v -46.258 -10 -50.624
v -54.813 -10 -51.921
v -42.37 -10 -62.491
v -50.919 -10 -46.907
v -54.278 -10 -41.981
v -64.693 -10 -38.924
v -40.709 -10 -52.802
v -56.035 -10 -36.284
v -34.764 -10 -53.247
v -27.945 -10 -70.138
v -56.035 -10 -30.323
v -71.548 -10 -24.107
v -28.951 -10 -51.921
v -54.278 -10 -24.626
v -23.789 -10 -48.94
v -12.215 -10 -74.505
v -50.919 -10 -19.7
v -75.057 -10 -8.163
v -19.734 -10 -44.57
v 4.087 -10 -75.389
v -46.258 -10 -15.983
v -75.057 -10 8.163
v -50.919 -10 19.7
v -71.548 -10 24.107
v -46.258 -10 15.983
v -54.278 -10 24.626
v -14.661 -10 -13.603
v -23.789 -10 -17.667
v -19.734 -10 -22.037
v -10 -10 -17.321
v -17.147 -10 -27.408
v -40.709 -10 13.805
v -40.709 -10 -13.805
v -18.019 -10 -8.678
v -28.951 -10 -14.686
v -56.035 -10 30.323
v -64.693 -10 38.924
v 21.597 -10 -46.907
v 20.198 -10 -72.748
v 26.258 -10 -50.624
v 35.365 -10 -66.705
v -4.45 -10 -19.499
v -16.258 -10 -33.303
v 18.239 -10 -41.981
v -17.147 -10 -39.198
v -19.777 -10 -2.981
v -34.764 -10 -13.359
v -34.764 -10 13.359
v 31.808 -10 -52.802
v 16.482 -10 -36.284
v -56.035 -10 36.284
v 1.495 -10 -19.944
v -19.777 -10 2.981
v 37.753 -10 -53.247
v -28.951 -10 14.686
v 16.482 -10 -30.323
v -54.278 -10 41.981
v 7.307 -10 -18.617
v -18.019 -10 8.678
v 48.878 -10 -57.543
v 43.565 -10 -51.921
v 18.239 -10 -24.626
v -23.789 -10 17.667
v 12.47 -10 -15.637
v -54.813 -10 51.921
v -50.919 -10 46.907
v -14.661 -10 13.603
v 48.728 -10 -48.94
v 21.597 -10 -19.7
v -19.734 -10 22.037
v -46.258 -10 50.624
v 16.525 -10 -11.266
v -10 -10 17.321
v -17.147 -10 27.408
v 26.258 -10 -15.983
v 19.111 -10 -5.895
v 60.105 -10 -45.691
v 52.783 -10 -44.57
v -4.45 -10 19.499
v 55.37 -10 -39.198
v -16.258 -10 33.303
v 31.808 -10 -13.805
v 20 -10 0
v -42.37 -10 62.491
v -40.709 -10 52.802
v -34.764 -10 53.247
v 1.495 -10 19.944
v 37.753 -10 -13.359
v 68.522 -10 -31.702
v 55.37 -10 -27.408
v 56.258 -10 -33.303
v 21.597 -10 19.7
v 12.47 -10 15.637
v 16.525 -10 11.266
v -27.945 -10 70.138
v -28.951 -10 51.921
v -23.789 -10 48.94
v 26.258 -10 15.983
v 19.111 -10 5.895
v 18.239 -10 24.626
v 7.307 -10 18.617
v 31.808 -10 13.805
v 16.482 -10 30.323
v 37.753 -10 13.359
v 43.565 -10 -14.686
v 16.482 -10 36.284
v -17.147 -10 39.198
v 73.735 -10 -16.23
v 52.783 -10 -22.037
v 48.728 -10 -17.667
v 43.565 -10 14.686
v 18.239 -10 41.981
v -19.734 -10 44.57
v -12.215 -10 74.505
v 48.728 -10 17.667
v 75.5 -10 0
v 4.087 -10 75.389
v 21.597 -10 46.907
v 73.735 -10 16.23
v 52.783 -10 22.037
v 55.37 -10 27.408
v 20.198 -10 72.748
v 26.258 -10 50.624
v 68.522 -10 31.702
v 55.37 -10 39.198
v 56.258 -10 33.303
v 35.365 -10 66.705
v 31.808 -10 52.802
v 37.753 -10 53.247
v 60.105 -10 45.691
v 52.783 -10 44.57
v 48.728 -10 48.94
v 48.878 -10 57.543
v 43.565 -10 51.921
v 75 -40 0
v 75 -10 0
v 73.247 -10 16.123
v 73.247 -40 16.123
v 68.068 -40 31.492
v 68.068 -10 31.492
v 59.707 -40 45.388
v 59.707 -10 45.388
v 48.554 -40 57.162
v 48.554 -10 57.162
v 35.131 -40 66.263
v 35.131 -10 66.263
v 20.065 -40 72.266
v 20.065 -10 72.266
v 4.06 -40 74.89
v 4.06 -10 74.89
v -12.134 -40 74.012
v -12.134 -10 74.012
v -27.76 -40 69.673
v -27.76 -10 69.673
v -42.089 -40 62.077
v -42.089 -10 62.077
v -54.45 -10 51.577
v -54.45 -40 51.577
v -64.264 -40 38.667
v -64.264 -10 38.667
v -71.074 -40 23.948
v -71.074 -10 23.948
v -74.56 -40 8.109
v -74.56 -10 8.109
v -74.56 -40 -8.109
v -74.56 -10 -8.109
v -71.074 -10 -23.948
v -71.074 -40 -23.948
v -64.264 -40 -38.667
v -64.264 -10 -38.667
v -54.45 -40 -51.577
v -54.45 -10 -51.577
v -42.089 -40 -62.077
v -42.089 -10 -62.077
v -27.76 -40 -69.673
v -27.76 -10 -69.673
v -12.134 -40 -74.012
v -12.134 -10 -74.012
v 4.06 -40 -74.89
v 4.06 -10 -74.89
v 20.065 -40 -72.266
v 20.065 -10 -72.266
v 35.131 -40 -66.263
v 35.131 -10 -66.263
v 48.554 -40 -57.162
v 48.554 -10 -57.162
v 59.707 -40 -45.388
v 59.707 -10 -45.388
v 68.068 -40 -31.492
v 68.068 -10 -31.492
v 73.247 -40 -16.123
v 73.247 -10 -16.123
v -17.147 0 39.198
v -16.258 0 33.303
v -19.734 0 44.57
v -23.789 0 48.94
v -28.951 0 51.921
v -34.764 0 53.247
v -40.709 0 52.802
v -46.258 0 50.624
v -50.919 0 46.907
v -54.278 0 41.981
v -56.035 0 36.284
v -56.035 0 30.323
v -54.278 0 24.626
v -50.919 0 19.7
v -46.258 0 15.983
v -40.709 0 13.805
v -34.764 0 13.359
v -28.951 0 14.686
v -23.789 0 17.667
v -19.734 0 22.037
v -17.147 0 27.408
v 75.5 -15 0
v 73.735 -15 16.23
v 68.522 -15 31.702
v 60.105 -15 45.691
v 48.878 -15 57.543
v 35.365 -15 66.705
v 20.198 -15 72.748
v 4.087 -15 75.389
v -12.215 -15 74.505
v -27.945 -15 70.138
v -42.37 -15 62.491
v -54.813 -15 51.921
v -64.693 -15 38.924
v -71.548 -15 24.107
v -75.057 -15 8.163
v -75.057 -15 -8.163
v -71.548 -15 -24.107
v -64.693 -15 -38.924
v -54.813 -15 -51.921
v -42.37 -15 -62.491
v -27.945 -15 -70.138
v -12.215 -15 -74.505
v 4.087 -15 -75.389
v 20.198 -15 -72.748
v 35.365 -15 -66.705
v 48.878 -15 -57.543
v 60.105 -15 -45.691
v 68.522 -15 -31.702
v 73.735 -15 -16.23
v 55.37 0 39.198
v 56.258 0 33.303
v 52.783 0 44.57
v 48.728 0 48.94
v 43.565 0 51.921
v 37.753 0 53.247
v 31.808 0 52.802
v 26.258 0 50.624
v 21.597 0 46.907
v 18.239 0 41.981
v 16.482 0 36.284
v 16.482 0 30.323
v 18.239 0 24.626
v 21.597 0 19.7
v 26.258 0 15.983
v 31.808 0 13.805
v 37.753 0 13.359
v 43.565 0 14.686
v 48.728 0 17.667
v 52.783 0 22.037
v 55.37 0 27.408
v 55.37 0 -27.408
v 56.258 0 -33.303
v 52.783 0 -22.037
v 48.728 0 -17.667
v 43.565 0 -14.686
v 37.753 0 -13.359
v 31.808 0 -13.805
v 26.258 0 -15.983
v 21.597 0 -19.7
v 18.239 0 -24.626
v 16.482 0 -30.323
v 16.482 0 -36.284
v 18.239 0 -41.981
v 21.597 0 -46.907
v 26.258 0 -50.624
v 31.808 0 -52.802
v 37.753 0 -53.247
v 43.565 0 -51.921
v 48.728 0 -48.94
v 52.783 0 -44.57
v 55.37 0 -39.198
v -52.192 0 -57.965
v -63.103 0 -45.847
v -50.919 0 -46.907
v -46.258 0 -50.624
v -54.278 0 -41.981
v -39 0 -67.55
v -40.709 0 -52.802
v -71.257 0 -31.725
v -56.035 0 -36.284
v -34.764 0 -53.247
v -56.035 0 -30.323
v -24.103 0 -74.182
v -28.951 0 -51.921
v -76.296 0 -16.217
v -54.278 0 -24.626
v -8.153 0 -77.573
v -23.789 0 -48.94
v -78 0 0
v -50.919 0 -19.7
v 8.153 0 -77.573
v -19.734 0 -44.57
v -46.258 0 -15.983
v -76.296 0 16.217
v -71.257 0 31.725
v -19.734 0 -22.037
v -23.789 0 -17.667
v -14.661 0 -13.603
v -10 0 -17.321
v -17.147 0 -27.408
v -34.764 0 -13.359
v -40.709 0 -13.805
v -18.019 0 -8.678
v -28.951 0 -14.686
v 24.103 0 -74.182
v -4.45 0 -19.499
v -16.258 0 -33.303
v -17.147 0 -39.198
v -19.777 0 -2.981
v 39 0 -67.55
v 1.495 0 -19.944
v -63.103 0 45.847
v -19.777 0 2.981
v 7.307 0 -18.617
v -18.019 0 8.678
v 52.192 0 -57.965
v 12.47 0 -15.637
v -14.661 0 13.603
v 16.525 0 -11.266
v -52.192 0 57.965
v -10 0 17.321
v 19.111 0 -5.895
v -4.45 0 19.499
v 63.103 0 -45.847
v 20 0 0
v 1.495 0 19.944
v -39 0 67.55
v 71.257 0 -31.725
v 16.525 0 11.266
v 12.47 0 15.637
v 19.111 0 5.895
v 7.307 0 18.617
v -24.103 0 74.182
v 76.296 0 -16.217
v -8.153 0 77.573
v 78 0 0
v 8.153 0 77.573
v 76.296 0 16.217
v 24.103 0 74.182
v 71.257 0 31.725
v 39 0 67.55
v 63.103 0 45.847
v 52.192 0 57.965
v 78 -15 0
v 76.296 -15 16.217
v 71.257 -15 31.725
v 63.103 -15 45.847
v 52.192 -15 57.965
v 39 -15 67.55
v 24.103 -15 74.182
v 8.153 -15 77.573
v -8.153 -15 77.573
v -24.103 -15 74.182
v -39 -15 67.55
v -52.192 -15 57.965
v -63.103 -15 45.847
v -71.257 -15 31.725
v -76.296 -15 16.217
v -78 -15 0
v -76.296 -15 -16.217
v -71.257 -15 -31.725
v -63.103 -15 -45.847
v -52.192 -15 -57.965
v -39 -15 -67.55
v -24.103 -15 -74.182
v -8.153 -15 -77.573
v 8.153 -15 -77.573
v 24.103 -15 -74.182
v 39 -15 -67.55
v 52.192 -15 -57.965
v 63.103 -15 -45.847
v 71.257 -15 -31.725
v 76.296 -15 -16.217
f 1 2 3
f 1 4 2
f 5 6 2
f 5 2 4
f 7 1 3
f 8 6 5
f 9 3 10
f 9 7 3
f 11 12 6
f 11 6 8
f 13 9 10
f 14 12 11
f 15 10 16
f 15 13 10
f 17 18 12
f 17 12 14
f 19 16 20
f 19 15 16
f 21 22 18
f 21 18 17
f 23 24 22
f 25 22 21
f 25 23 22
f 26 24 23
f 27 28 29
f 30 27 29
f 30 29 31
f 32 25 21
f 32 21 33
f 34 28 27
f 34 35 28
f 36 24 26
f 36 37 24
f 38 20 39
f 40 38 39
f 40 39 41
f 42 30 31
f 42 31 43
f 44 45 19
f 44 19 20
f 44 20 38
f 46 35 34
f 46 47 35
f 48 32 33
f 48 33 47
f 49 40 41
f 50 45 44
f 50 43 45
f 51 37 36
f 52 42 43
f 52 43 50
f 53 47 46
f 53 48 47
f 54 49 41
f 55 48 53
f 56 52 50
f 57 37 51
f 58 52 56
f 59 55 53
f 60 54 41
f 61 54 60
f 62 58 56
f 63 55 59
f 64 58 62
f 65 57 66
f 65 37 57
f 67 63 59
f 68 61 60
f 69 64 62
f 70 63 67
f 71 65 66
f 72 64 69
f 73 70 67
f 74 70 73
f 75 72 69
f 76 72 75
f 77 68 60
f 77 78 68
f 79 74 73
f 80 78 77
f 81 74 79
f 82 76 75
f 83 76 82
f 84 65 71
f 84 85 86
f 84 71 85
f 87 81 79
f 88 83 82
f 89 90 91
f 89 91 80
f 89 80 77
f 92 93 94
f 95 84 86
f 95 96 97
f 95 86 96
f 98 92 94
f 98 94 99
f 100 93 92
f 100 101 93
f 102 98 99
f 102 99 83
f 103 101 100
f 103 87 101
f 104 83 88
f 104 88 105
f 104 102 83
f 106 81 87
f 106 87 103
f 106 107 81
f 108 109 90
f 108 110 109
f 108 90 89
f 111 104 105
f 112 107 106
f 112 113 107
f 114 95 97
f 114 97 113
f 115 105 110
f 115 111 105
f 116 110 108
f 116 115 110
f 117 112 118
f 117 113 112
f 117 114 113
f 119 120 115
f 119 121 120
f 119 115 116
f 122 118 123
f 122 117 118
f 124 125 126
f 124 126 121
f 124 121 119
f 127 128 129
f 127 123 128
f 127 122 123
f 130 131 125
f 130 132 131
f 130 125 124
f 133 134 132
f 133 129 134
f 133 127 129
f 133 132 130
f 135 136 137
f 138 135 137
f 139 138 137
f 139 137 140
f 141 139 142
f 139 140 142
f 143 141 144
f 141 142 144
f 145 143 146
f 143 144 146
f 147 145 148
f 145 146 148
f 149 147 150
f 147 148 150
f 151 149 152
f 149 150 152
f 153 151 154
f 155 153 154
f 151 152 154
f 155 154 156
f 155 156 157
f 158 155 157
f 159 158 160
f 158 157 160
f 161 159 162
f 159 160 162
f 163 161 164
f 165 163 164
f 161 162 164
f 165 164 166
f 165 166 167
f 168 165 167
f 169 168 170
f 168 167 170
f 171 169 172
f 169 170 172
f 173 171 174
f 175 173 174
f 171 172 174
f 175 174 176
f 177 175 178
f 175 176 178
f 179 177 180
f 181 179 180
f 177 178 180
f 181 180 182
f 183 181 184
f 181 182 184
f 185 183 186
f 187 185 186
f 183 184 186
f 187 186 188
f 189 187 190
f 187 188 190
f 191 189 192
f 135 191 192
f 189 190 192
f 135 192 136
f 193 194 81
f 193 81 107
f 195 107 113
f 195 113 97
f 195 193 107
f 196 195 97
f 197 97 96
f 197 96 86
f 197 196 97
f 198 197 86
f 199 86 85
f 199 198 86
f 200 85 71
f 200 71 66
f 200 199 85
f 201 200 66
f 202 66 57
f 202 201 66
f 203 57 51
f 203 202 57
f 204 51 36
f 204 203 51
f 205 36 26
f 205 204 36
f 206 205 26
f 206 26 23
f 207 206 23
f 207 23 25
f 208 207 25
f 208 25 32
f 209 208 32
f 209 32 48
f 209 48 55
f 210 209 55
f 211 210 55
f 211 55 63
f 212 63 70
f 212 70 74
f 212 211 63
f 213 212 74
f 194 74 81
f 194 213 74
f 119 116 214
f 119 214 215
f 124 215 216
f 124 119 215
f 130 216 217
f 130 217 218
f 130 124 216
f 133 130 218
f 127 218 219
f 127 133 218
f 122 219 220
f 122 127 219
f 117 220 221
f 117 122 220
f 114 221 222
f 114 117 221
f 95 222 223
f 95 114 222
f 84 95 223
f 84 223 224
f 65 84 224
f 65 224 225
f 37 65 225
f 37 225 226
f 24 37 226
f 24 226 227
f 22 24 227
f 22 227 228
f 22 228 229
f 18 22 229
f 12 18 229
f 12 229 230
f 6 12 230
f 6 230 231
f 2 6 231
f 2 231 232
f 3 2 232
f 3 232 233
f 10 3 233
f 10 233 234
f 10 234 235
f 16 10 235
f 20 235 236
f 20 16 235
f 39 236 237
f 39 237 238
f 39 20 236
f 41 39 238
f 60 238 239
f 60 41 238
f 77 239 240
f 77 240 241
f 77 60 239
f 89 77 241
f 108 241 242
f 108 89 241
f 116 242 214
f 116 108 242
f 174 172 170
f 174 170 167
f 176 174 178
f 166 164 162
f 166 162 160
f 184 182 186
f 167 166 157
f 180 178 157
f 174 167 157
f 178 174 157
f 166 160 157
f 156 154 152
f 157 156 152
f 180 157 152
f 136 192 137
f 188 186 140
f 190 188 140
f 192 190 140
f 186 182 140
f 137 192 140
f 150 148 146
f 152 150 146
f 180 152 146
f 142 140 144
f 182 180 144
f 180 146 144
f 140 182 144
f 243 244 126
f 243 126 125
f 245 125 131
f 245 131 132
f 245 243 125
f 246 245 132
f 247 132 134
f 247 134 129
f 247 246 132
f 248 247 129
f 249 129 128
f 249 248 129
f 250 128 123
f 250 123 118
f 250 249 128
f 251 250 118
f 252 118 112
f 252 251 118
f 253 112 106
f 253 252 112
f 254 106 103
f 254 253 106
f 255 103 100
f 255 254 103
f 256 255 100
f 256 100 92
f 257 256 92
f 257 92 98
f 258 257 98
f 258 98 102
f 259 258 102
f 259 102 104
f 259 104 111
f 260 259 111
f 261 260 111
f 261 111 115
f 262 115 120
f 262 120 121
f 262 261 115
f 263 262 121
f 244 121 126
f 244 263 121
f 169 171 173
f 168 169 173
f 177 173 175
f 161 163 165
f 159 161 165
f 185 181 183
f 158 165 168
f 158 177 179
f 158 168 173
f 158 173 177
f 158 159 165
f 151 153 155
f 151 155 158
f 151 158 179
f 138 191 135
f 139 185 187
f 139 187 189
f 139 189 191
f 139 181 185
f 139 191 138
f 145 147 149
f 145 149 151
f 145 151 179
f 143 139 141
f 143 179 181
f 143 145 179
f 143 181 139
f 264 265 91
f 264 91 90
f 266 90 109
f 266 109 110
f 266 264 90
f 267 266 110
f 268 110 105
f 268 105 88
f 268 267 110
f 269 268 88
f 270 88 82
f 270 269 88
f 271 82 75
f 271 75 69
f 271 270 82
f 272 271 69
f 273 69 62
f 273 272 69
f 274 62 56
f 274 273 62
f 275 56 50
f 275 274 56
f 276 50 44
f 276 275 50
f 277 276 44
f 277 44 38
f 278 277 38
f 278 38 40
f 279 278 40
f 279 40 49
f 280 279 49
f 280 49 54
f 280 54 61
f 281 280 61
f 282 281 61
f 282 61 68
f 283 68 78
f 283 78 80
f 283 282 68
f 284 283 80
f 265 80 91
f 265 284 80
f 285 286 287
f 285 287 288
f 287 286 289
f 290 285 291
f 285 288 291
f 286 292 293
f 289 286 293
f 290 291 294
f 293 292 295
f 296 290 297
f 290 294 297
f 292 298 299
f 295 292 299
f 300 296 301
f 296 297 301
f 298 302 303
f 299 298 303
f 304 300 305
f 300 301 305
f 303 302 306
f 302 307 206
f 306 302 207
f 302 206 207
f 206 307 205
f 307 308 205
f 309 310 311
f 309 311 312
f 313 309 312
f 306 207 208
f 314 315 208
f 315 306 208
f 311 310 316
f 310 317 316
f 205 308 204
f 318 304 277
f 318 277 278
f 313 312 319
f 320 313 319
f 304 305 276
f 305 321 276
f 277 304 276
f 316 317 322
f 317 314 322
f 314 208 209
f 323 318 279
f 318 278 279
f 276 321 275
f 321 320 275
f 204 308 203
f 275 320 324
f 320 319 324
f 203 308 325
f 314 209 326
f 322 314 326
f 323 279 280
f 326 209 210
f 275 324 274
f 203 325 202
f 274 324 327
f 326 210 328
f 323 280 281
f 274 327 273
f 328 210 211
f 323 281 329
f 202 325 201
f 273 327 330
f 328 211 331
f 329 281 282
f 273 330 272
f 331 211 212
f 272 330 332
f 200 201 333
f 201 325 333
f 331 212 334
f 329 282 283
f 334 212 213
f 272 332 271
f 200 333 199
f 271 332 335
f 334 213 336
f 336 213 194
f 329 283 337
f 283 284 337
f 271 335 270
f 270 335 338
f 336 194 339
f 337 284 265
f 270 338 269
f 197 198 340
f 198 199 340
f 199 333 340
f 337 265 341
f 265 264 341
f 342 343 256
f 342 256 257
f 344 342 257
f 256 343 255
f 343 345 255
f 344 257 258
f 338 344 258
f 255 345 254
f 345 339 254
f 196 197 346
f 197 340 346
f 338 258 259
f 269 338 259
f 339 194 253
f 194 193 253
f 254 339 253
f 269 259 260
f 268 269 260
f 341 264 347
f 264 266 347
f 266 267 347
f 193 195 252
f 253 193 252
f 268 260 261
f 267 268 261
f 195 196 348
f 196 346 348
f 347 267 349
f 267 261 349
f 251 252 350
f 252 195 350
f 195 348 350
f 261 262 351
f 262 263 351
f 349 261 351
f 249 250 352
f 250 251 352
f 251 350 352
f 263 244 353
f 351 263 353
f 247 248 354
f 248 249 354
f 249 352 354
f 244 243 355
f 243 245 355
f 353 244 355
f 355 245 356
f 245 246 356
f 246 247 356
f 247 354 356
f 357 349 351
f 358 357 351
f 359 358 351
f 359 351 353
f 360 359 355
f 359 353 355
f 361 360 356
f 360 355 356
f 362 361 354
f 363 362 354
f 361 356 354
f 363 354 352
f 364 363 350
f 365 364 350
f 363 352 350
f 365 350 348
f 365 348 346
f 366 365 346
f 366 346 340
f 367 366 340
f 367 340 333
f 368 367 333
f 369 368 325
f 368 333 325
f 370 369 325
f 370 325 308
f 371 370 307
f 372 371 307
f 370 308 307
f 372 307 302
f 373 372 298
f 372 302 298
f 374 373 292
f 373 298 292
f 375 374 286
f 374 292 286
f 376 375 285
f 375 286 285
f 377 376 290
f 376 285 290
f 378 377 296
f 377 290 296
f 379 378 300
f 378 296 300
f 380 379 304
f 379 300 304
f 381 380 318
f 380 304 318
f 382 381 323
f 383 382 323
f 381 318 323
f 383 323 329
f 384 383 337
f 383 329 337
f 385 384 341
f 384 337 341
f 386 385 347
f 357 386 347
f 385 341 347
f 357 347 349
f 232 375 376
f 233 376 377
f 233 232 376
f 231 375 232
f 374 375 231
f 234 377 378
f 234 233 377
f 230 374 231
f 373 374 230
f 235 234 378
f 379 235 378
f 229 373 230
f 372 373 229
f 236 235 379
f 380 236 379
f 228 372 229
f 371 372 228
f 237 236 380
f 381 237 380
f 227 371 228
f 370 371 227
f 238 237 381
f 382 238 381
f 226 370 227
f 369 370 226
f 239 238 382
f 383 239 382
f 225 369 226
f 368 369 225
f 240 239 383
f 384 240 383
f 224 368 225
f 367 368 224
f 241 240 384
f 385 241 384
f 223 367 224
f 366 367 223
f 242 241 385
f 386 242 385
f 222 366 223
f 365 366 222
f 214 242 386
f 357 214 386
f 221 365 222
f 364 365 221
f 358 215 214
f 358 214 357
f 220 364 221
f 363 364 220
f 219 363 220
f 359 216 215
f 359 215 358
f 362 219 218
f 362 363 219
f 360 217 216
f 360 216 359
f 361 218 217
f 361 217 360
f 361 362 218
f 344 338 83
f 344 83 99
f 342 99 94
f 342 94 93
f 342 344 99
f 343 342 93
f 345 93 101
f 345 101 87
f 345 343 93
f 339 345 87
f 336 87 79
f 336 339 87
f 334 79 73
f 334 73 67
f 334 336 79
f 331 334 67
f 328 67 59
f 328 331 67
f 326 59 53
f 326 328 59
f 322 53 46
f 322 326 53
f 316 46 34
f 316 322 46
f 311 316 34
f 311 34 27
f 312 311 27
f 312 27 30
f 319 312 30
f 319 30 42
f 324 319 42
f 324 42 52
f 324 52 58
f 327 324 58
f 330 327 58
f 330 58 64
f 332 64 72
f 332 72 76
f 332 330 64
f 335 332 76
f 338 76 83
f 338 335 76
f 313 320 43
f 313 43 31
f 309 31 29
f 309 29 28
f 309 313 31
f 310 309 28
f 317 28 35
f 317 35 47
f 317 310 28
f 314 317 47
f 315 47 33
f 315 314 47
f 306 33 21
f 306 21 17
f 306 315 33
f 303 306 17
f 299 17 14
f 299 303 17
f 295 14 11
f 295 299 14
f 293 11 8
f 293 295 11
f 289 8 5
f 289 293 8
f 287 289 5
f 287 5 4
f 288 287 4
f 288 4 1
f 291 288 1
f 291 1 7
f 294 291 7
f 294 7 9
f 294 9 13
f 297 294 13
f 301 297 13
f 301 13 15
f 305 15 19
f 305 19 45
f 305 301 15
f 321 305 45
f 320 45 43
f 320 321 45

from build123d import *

# Parameters (mm, degrees)
F0_R     = 75.5
F0_R_2   = 20
F1_DEPTH = 10
F0_R_3   = 78
F2_DEPTH = 15
F3_R     = 75
F3_R_2   = 20
F4_DEPTH = 30


with BuildPart() as f1:
    # F0 (on Front) → F1 (new body)
    with BuildSketch(Plane.XZ):
        Circle(F0_R)
        with Locations((-36.2583191526, -33.3033913191)):
            Circle(F0_R_2, mode=Mode.SUBTRACT)
        with Locations((36.2583191526, -33.3033913191)):
            Circle(F0_R_2, mode=Mode.SUBTRACT)
        with Locations((-36.2583191526, 33.3033913191)):
            Circle(F0_R_2, mode=Mode.SUBTRACT)
        Circle(F0_R_2, mode=Mode.SUBTRACT)
        with Locations((36.2583191526, 33.3033913191)):
            Circle(F0_R_2, mode=Mode.SUBTRACT)
    extrude(amount=F1_DEPTH)

    # F0 (on Front) → F2 (join)
    with BuildSketch(Plane.XZ):
        Circle(F0_R_3)
        Circle(F0_R, mode=Mode.SUBTRACT)
    extrude(amount=F2_DEPTH)


with BuildPart() as f4:
    # F3 (on face) → F4 (new body)
    with BuildSketch(Plane.XZ.offset(10)):
        Circle(F3_R)
        with Locations((-36.2583191526, -33.3033913191)):
            Circle(F3_R_2, mode=Mode.SUBTRACT)
        with Locations((36.2583191526, -33.3033913191)):
            Circle(F3_R_2, mode=Mode.SUBTRACT)
        with Locations((-36.2583191526, 33.3033913191)):
            Circle(F3_R_2, mode=Mode.SUBTRACT)
        Circle(F3_R_2, mode=Mode.SUBTRACT)
        with Locations((36.2583191526, 33.3033913191)):
            Circle(F3_R_2, mode=Mode.SUBTRACT)
        with Locations((36.2583191526, 33.3033913191)):
            Circle(F3_R_2)
        with Locations((-36.2583191526, 33.3033913191)):
            Circle(F3_R_2)
        with Locations((-36.2583191526, -33.3033913191)):
            Circle(F3_R_2)
        with Locations((36.2583191526, -33.3033913191)):
            Circle(F3_R_2)
        Circle(F3_R_2)
    extrude(amount=F4_DEPTH)


solid = Compound([f1.part, f4.part])
